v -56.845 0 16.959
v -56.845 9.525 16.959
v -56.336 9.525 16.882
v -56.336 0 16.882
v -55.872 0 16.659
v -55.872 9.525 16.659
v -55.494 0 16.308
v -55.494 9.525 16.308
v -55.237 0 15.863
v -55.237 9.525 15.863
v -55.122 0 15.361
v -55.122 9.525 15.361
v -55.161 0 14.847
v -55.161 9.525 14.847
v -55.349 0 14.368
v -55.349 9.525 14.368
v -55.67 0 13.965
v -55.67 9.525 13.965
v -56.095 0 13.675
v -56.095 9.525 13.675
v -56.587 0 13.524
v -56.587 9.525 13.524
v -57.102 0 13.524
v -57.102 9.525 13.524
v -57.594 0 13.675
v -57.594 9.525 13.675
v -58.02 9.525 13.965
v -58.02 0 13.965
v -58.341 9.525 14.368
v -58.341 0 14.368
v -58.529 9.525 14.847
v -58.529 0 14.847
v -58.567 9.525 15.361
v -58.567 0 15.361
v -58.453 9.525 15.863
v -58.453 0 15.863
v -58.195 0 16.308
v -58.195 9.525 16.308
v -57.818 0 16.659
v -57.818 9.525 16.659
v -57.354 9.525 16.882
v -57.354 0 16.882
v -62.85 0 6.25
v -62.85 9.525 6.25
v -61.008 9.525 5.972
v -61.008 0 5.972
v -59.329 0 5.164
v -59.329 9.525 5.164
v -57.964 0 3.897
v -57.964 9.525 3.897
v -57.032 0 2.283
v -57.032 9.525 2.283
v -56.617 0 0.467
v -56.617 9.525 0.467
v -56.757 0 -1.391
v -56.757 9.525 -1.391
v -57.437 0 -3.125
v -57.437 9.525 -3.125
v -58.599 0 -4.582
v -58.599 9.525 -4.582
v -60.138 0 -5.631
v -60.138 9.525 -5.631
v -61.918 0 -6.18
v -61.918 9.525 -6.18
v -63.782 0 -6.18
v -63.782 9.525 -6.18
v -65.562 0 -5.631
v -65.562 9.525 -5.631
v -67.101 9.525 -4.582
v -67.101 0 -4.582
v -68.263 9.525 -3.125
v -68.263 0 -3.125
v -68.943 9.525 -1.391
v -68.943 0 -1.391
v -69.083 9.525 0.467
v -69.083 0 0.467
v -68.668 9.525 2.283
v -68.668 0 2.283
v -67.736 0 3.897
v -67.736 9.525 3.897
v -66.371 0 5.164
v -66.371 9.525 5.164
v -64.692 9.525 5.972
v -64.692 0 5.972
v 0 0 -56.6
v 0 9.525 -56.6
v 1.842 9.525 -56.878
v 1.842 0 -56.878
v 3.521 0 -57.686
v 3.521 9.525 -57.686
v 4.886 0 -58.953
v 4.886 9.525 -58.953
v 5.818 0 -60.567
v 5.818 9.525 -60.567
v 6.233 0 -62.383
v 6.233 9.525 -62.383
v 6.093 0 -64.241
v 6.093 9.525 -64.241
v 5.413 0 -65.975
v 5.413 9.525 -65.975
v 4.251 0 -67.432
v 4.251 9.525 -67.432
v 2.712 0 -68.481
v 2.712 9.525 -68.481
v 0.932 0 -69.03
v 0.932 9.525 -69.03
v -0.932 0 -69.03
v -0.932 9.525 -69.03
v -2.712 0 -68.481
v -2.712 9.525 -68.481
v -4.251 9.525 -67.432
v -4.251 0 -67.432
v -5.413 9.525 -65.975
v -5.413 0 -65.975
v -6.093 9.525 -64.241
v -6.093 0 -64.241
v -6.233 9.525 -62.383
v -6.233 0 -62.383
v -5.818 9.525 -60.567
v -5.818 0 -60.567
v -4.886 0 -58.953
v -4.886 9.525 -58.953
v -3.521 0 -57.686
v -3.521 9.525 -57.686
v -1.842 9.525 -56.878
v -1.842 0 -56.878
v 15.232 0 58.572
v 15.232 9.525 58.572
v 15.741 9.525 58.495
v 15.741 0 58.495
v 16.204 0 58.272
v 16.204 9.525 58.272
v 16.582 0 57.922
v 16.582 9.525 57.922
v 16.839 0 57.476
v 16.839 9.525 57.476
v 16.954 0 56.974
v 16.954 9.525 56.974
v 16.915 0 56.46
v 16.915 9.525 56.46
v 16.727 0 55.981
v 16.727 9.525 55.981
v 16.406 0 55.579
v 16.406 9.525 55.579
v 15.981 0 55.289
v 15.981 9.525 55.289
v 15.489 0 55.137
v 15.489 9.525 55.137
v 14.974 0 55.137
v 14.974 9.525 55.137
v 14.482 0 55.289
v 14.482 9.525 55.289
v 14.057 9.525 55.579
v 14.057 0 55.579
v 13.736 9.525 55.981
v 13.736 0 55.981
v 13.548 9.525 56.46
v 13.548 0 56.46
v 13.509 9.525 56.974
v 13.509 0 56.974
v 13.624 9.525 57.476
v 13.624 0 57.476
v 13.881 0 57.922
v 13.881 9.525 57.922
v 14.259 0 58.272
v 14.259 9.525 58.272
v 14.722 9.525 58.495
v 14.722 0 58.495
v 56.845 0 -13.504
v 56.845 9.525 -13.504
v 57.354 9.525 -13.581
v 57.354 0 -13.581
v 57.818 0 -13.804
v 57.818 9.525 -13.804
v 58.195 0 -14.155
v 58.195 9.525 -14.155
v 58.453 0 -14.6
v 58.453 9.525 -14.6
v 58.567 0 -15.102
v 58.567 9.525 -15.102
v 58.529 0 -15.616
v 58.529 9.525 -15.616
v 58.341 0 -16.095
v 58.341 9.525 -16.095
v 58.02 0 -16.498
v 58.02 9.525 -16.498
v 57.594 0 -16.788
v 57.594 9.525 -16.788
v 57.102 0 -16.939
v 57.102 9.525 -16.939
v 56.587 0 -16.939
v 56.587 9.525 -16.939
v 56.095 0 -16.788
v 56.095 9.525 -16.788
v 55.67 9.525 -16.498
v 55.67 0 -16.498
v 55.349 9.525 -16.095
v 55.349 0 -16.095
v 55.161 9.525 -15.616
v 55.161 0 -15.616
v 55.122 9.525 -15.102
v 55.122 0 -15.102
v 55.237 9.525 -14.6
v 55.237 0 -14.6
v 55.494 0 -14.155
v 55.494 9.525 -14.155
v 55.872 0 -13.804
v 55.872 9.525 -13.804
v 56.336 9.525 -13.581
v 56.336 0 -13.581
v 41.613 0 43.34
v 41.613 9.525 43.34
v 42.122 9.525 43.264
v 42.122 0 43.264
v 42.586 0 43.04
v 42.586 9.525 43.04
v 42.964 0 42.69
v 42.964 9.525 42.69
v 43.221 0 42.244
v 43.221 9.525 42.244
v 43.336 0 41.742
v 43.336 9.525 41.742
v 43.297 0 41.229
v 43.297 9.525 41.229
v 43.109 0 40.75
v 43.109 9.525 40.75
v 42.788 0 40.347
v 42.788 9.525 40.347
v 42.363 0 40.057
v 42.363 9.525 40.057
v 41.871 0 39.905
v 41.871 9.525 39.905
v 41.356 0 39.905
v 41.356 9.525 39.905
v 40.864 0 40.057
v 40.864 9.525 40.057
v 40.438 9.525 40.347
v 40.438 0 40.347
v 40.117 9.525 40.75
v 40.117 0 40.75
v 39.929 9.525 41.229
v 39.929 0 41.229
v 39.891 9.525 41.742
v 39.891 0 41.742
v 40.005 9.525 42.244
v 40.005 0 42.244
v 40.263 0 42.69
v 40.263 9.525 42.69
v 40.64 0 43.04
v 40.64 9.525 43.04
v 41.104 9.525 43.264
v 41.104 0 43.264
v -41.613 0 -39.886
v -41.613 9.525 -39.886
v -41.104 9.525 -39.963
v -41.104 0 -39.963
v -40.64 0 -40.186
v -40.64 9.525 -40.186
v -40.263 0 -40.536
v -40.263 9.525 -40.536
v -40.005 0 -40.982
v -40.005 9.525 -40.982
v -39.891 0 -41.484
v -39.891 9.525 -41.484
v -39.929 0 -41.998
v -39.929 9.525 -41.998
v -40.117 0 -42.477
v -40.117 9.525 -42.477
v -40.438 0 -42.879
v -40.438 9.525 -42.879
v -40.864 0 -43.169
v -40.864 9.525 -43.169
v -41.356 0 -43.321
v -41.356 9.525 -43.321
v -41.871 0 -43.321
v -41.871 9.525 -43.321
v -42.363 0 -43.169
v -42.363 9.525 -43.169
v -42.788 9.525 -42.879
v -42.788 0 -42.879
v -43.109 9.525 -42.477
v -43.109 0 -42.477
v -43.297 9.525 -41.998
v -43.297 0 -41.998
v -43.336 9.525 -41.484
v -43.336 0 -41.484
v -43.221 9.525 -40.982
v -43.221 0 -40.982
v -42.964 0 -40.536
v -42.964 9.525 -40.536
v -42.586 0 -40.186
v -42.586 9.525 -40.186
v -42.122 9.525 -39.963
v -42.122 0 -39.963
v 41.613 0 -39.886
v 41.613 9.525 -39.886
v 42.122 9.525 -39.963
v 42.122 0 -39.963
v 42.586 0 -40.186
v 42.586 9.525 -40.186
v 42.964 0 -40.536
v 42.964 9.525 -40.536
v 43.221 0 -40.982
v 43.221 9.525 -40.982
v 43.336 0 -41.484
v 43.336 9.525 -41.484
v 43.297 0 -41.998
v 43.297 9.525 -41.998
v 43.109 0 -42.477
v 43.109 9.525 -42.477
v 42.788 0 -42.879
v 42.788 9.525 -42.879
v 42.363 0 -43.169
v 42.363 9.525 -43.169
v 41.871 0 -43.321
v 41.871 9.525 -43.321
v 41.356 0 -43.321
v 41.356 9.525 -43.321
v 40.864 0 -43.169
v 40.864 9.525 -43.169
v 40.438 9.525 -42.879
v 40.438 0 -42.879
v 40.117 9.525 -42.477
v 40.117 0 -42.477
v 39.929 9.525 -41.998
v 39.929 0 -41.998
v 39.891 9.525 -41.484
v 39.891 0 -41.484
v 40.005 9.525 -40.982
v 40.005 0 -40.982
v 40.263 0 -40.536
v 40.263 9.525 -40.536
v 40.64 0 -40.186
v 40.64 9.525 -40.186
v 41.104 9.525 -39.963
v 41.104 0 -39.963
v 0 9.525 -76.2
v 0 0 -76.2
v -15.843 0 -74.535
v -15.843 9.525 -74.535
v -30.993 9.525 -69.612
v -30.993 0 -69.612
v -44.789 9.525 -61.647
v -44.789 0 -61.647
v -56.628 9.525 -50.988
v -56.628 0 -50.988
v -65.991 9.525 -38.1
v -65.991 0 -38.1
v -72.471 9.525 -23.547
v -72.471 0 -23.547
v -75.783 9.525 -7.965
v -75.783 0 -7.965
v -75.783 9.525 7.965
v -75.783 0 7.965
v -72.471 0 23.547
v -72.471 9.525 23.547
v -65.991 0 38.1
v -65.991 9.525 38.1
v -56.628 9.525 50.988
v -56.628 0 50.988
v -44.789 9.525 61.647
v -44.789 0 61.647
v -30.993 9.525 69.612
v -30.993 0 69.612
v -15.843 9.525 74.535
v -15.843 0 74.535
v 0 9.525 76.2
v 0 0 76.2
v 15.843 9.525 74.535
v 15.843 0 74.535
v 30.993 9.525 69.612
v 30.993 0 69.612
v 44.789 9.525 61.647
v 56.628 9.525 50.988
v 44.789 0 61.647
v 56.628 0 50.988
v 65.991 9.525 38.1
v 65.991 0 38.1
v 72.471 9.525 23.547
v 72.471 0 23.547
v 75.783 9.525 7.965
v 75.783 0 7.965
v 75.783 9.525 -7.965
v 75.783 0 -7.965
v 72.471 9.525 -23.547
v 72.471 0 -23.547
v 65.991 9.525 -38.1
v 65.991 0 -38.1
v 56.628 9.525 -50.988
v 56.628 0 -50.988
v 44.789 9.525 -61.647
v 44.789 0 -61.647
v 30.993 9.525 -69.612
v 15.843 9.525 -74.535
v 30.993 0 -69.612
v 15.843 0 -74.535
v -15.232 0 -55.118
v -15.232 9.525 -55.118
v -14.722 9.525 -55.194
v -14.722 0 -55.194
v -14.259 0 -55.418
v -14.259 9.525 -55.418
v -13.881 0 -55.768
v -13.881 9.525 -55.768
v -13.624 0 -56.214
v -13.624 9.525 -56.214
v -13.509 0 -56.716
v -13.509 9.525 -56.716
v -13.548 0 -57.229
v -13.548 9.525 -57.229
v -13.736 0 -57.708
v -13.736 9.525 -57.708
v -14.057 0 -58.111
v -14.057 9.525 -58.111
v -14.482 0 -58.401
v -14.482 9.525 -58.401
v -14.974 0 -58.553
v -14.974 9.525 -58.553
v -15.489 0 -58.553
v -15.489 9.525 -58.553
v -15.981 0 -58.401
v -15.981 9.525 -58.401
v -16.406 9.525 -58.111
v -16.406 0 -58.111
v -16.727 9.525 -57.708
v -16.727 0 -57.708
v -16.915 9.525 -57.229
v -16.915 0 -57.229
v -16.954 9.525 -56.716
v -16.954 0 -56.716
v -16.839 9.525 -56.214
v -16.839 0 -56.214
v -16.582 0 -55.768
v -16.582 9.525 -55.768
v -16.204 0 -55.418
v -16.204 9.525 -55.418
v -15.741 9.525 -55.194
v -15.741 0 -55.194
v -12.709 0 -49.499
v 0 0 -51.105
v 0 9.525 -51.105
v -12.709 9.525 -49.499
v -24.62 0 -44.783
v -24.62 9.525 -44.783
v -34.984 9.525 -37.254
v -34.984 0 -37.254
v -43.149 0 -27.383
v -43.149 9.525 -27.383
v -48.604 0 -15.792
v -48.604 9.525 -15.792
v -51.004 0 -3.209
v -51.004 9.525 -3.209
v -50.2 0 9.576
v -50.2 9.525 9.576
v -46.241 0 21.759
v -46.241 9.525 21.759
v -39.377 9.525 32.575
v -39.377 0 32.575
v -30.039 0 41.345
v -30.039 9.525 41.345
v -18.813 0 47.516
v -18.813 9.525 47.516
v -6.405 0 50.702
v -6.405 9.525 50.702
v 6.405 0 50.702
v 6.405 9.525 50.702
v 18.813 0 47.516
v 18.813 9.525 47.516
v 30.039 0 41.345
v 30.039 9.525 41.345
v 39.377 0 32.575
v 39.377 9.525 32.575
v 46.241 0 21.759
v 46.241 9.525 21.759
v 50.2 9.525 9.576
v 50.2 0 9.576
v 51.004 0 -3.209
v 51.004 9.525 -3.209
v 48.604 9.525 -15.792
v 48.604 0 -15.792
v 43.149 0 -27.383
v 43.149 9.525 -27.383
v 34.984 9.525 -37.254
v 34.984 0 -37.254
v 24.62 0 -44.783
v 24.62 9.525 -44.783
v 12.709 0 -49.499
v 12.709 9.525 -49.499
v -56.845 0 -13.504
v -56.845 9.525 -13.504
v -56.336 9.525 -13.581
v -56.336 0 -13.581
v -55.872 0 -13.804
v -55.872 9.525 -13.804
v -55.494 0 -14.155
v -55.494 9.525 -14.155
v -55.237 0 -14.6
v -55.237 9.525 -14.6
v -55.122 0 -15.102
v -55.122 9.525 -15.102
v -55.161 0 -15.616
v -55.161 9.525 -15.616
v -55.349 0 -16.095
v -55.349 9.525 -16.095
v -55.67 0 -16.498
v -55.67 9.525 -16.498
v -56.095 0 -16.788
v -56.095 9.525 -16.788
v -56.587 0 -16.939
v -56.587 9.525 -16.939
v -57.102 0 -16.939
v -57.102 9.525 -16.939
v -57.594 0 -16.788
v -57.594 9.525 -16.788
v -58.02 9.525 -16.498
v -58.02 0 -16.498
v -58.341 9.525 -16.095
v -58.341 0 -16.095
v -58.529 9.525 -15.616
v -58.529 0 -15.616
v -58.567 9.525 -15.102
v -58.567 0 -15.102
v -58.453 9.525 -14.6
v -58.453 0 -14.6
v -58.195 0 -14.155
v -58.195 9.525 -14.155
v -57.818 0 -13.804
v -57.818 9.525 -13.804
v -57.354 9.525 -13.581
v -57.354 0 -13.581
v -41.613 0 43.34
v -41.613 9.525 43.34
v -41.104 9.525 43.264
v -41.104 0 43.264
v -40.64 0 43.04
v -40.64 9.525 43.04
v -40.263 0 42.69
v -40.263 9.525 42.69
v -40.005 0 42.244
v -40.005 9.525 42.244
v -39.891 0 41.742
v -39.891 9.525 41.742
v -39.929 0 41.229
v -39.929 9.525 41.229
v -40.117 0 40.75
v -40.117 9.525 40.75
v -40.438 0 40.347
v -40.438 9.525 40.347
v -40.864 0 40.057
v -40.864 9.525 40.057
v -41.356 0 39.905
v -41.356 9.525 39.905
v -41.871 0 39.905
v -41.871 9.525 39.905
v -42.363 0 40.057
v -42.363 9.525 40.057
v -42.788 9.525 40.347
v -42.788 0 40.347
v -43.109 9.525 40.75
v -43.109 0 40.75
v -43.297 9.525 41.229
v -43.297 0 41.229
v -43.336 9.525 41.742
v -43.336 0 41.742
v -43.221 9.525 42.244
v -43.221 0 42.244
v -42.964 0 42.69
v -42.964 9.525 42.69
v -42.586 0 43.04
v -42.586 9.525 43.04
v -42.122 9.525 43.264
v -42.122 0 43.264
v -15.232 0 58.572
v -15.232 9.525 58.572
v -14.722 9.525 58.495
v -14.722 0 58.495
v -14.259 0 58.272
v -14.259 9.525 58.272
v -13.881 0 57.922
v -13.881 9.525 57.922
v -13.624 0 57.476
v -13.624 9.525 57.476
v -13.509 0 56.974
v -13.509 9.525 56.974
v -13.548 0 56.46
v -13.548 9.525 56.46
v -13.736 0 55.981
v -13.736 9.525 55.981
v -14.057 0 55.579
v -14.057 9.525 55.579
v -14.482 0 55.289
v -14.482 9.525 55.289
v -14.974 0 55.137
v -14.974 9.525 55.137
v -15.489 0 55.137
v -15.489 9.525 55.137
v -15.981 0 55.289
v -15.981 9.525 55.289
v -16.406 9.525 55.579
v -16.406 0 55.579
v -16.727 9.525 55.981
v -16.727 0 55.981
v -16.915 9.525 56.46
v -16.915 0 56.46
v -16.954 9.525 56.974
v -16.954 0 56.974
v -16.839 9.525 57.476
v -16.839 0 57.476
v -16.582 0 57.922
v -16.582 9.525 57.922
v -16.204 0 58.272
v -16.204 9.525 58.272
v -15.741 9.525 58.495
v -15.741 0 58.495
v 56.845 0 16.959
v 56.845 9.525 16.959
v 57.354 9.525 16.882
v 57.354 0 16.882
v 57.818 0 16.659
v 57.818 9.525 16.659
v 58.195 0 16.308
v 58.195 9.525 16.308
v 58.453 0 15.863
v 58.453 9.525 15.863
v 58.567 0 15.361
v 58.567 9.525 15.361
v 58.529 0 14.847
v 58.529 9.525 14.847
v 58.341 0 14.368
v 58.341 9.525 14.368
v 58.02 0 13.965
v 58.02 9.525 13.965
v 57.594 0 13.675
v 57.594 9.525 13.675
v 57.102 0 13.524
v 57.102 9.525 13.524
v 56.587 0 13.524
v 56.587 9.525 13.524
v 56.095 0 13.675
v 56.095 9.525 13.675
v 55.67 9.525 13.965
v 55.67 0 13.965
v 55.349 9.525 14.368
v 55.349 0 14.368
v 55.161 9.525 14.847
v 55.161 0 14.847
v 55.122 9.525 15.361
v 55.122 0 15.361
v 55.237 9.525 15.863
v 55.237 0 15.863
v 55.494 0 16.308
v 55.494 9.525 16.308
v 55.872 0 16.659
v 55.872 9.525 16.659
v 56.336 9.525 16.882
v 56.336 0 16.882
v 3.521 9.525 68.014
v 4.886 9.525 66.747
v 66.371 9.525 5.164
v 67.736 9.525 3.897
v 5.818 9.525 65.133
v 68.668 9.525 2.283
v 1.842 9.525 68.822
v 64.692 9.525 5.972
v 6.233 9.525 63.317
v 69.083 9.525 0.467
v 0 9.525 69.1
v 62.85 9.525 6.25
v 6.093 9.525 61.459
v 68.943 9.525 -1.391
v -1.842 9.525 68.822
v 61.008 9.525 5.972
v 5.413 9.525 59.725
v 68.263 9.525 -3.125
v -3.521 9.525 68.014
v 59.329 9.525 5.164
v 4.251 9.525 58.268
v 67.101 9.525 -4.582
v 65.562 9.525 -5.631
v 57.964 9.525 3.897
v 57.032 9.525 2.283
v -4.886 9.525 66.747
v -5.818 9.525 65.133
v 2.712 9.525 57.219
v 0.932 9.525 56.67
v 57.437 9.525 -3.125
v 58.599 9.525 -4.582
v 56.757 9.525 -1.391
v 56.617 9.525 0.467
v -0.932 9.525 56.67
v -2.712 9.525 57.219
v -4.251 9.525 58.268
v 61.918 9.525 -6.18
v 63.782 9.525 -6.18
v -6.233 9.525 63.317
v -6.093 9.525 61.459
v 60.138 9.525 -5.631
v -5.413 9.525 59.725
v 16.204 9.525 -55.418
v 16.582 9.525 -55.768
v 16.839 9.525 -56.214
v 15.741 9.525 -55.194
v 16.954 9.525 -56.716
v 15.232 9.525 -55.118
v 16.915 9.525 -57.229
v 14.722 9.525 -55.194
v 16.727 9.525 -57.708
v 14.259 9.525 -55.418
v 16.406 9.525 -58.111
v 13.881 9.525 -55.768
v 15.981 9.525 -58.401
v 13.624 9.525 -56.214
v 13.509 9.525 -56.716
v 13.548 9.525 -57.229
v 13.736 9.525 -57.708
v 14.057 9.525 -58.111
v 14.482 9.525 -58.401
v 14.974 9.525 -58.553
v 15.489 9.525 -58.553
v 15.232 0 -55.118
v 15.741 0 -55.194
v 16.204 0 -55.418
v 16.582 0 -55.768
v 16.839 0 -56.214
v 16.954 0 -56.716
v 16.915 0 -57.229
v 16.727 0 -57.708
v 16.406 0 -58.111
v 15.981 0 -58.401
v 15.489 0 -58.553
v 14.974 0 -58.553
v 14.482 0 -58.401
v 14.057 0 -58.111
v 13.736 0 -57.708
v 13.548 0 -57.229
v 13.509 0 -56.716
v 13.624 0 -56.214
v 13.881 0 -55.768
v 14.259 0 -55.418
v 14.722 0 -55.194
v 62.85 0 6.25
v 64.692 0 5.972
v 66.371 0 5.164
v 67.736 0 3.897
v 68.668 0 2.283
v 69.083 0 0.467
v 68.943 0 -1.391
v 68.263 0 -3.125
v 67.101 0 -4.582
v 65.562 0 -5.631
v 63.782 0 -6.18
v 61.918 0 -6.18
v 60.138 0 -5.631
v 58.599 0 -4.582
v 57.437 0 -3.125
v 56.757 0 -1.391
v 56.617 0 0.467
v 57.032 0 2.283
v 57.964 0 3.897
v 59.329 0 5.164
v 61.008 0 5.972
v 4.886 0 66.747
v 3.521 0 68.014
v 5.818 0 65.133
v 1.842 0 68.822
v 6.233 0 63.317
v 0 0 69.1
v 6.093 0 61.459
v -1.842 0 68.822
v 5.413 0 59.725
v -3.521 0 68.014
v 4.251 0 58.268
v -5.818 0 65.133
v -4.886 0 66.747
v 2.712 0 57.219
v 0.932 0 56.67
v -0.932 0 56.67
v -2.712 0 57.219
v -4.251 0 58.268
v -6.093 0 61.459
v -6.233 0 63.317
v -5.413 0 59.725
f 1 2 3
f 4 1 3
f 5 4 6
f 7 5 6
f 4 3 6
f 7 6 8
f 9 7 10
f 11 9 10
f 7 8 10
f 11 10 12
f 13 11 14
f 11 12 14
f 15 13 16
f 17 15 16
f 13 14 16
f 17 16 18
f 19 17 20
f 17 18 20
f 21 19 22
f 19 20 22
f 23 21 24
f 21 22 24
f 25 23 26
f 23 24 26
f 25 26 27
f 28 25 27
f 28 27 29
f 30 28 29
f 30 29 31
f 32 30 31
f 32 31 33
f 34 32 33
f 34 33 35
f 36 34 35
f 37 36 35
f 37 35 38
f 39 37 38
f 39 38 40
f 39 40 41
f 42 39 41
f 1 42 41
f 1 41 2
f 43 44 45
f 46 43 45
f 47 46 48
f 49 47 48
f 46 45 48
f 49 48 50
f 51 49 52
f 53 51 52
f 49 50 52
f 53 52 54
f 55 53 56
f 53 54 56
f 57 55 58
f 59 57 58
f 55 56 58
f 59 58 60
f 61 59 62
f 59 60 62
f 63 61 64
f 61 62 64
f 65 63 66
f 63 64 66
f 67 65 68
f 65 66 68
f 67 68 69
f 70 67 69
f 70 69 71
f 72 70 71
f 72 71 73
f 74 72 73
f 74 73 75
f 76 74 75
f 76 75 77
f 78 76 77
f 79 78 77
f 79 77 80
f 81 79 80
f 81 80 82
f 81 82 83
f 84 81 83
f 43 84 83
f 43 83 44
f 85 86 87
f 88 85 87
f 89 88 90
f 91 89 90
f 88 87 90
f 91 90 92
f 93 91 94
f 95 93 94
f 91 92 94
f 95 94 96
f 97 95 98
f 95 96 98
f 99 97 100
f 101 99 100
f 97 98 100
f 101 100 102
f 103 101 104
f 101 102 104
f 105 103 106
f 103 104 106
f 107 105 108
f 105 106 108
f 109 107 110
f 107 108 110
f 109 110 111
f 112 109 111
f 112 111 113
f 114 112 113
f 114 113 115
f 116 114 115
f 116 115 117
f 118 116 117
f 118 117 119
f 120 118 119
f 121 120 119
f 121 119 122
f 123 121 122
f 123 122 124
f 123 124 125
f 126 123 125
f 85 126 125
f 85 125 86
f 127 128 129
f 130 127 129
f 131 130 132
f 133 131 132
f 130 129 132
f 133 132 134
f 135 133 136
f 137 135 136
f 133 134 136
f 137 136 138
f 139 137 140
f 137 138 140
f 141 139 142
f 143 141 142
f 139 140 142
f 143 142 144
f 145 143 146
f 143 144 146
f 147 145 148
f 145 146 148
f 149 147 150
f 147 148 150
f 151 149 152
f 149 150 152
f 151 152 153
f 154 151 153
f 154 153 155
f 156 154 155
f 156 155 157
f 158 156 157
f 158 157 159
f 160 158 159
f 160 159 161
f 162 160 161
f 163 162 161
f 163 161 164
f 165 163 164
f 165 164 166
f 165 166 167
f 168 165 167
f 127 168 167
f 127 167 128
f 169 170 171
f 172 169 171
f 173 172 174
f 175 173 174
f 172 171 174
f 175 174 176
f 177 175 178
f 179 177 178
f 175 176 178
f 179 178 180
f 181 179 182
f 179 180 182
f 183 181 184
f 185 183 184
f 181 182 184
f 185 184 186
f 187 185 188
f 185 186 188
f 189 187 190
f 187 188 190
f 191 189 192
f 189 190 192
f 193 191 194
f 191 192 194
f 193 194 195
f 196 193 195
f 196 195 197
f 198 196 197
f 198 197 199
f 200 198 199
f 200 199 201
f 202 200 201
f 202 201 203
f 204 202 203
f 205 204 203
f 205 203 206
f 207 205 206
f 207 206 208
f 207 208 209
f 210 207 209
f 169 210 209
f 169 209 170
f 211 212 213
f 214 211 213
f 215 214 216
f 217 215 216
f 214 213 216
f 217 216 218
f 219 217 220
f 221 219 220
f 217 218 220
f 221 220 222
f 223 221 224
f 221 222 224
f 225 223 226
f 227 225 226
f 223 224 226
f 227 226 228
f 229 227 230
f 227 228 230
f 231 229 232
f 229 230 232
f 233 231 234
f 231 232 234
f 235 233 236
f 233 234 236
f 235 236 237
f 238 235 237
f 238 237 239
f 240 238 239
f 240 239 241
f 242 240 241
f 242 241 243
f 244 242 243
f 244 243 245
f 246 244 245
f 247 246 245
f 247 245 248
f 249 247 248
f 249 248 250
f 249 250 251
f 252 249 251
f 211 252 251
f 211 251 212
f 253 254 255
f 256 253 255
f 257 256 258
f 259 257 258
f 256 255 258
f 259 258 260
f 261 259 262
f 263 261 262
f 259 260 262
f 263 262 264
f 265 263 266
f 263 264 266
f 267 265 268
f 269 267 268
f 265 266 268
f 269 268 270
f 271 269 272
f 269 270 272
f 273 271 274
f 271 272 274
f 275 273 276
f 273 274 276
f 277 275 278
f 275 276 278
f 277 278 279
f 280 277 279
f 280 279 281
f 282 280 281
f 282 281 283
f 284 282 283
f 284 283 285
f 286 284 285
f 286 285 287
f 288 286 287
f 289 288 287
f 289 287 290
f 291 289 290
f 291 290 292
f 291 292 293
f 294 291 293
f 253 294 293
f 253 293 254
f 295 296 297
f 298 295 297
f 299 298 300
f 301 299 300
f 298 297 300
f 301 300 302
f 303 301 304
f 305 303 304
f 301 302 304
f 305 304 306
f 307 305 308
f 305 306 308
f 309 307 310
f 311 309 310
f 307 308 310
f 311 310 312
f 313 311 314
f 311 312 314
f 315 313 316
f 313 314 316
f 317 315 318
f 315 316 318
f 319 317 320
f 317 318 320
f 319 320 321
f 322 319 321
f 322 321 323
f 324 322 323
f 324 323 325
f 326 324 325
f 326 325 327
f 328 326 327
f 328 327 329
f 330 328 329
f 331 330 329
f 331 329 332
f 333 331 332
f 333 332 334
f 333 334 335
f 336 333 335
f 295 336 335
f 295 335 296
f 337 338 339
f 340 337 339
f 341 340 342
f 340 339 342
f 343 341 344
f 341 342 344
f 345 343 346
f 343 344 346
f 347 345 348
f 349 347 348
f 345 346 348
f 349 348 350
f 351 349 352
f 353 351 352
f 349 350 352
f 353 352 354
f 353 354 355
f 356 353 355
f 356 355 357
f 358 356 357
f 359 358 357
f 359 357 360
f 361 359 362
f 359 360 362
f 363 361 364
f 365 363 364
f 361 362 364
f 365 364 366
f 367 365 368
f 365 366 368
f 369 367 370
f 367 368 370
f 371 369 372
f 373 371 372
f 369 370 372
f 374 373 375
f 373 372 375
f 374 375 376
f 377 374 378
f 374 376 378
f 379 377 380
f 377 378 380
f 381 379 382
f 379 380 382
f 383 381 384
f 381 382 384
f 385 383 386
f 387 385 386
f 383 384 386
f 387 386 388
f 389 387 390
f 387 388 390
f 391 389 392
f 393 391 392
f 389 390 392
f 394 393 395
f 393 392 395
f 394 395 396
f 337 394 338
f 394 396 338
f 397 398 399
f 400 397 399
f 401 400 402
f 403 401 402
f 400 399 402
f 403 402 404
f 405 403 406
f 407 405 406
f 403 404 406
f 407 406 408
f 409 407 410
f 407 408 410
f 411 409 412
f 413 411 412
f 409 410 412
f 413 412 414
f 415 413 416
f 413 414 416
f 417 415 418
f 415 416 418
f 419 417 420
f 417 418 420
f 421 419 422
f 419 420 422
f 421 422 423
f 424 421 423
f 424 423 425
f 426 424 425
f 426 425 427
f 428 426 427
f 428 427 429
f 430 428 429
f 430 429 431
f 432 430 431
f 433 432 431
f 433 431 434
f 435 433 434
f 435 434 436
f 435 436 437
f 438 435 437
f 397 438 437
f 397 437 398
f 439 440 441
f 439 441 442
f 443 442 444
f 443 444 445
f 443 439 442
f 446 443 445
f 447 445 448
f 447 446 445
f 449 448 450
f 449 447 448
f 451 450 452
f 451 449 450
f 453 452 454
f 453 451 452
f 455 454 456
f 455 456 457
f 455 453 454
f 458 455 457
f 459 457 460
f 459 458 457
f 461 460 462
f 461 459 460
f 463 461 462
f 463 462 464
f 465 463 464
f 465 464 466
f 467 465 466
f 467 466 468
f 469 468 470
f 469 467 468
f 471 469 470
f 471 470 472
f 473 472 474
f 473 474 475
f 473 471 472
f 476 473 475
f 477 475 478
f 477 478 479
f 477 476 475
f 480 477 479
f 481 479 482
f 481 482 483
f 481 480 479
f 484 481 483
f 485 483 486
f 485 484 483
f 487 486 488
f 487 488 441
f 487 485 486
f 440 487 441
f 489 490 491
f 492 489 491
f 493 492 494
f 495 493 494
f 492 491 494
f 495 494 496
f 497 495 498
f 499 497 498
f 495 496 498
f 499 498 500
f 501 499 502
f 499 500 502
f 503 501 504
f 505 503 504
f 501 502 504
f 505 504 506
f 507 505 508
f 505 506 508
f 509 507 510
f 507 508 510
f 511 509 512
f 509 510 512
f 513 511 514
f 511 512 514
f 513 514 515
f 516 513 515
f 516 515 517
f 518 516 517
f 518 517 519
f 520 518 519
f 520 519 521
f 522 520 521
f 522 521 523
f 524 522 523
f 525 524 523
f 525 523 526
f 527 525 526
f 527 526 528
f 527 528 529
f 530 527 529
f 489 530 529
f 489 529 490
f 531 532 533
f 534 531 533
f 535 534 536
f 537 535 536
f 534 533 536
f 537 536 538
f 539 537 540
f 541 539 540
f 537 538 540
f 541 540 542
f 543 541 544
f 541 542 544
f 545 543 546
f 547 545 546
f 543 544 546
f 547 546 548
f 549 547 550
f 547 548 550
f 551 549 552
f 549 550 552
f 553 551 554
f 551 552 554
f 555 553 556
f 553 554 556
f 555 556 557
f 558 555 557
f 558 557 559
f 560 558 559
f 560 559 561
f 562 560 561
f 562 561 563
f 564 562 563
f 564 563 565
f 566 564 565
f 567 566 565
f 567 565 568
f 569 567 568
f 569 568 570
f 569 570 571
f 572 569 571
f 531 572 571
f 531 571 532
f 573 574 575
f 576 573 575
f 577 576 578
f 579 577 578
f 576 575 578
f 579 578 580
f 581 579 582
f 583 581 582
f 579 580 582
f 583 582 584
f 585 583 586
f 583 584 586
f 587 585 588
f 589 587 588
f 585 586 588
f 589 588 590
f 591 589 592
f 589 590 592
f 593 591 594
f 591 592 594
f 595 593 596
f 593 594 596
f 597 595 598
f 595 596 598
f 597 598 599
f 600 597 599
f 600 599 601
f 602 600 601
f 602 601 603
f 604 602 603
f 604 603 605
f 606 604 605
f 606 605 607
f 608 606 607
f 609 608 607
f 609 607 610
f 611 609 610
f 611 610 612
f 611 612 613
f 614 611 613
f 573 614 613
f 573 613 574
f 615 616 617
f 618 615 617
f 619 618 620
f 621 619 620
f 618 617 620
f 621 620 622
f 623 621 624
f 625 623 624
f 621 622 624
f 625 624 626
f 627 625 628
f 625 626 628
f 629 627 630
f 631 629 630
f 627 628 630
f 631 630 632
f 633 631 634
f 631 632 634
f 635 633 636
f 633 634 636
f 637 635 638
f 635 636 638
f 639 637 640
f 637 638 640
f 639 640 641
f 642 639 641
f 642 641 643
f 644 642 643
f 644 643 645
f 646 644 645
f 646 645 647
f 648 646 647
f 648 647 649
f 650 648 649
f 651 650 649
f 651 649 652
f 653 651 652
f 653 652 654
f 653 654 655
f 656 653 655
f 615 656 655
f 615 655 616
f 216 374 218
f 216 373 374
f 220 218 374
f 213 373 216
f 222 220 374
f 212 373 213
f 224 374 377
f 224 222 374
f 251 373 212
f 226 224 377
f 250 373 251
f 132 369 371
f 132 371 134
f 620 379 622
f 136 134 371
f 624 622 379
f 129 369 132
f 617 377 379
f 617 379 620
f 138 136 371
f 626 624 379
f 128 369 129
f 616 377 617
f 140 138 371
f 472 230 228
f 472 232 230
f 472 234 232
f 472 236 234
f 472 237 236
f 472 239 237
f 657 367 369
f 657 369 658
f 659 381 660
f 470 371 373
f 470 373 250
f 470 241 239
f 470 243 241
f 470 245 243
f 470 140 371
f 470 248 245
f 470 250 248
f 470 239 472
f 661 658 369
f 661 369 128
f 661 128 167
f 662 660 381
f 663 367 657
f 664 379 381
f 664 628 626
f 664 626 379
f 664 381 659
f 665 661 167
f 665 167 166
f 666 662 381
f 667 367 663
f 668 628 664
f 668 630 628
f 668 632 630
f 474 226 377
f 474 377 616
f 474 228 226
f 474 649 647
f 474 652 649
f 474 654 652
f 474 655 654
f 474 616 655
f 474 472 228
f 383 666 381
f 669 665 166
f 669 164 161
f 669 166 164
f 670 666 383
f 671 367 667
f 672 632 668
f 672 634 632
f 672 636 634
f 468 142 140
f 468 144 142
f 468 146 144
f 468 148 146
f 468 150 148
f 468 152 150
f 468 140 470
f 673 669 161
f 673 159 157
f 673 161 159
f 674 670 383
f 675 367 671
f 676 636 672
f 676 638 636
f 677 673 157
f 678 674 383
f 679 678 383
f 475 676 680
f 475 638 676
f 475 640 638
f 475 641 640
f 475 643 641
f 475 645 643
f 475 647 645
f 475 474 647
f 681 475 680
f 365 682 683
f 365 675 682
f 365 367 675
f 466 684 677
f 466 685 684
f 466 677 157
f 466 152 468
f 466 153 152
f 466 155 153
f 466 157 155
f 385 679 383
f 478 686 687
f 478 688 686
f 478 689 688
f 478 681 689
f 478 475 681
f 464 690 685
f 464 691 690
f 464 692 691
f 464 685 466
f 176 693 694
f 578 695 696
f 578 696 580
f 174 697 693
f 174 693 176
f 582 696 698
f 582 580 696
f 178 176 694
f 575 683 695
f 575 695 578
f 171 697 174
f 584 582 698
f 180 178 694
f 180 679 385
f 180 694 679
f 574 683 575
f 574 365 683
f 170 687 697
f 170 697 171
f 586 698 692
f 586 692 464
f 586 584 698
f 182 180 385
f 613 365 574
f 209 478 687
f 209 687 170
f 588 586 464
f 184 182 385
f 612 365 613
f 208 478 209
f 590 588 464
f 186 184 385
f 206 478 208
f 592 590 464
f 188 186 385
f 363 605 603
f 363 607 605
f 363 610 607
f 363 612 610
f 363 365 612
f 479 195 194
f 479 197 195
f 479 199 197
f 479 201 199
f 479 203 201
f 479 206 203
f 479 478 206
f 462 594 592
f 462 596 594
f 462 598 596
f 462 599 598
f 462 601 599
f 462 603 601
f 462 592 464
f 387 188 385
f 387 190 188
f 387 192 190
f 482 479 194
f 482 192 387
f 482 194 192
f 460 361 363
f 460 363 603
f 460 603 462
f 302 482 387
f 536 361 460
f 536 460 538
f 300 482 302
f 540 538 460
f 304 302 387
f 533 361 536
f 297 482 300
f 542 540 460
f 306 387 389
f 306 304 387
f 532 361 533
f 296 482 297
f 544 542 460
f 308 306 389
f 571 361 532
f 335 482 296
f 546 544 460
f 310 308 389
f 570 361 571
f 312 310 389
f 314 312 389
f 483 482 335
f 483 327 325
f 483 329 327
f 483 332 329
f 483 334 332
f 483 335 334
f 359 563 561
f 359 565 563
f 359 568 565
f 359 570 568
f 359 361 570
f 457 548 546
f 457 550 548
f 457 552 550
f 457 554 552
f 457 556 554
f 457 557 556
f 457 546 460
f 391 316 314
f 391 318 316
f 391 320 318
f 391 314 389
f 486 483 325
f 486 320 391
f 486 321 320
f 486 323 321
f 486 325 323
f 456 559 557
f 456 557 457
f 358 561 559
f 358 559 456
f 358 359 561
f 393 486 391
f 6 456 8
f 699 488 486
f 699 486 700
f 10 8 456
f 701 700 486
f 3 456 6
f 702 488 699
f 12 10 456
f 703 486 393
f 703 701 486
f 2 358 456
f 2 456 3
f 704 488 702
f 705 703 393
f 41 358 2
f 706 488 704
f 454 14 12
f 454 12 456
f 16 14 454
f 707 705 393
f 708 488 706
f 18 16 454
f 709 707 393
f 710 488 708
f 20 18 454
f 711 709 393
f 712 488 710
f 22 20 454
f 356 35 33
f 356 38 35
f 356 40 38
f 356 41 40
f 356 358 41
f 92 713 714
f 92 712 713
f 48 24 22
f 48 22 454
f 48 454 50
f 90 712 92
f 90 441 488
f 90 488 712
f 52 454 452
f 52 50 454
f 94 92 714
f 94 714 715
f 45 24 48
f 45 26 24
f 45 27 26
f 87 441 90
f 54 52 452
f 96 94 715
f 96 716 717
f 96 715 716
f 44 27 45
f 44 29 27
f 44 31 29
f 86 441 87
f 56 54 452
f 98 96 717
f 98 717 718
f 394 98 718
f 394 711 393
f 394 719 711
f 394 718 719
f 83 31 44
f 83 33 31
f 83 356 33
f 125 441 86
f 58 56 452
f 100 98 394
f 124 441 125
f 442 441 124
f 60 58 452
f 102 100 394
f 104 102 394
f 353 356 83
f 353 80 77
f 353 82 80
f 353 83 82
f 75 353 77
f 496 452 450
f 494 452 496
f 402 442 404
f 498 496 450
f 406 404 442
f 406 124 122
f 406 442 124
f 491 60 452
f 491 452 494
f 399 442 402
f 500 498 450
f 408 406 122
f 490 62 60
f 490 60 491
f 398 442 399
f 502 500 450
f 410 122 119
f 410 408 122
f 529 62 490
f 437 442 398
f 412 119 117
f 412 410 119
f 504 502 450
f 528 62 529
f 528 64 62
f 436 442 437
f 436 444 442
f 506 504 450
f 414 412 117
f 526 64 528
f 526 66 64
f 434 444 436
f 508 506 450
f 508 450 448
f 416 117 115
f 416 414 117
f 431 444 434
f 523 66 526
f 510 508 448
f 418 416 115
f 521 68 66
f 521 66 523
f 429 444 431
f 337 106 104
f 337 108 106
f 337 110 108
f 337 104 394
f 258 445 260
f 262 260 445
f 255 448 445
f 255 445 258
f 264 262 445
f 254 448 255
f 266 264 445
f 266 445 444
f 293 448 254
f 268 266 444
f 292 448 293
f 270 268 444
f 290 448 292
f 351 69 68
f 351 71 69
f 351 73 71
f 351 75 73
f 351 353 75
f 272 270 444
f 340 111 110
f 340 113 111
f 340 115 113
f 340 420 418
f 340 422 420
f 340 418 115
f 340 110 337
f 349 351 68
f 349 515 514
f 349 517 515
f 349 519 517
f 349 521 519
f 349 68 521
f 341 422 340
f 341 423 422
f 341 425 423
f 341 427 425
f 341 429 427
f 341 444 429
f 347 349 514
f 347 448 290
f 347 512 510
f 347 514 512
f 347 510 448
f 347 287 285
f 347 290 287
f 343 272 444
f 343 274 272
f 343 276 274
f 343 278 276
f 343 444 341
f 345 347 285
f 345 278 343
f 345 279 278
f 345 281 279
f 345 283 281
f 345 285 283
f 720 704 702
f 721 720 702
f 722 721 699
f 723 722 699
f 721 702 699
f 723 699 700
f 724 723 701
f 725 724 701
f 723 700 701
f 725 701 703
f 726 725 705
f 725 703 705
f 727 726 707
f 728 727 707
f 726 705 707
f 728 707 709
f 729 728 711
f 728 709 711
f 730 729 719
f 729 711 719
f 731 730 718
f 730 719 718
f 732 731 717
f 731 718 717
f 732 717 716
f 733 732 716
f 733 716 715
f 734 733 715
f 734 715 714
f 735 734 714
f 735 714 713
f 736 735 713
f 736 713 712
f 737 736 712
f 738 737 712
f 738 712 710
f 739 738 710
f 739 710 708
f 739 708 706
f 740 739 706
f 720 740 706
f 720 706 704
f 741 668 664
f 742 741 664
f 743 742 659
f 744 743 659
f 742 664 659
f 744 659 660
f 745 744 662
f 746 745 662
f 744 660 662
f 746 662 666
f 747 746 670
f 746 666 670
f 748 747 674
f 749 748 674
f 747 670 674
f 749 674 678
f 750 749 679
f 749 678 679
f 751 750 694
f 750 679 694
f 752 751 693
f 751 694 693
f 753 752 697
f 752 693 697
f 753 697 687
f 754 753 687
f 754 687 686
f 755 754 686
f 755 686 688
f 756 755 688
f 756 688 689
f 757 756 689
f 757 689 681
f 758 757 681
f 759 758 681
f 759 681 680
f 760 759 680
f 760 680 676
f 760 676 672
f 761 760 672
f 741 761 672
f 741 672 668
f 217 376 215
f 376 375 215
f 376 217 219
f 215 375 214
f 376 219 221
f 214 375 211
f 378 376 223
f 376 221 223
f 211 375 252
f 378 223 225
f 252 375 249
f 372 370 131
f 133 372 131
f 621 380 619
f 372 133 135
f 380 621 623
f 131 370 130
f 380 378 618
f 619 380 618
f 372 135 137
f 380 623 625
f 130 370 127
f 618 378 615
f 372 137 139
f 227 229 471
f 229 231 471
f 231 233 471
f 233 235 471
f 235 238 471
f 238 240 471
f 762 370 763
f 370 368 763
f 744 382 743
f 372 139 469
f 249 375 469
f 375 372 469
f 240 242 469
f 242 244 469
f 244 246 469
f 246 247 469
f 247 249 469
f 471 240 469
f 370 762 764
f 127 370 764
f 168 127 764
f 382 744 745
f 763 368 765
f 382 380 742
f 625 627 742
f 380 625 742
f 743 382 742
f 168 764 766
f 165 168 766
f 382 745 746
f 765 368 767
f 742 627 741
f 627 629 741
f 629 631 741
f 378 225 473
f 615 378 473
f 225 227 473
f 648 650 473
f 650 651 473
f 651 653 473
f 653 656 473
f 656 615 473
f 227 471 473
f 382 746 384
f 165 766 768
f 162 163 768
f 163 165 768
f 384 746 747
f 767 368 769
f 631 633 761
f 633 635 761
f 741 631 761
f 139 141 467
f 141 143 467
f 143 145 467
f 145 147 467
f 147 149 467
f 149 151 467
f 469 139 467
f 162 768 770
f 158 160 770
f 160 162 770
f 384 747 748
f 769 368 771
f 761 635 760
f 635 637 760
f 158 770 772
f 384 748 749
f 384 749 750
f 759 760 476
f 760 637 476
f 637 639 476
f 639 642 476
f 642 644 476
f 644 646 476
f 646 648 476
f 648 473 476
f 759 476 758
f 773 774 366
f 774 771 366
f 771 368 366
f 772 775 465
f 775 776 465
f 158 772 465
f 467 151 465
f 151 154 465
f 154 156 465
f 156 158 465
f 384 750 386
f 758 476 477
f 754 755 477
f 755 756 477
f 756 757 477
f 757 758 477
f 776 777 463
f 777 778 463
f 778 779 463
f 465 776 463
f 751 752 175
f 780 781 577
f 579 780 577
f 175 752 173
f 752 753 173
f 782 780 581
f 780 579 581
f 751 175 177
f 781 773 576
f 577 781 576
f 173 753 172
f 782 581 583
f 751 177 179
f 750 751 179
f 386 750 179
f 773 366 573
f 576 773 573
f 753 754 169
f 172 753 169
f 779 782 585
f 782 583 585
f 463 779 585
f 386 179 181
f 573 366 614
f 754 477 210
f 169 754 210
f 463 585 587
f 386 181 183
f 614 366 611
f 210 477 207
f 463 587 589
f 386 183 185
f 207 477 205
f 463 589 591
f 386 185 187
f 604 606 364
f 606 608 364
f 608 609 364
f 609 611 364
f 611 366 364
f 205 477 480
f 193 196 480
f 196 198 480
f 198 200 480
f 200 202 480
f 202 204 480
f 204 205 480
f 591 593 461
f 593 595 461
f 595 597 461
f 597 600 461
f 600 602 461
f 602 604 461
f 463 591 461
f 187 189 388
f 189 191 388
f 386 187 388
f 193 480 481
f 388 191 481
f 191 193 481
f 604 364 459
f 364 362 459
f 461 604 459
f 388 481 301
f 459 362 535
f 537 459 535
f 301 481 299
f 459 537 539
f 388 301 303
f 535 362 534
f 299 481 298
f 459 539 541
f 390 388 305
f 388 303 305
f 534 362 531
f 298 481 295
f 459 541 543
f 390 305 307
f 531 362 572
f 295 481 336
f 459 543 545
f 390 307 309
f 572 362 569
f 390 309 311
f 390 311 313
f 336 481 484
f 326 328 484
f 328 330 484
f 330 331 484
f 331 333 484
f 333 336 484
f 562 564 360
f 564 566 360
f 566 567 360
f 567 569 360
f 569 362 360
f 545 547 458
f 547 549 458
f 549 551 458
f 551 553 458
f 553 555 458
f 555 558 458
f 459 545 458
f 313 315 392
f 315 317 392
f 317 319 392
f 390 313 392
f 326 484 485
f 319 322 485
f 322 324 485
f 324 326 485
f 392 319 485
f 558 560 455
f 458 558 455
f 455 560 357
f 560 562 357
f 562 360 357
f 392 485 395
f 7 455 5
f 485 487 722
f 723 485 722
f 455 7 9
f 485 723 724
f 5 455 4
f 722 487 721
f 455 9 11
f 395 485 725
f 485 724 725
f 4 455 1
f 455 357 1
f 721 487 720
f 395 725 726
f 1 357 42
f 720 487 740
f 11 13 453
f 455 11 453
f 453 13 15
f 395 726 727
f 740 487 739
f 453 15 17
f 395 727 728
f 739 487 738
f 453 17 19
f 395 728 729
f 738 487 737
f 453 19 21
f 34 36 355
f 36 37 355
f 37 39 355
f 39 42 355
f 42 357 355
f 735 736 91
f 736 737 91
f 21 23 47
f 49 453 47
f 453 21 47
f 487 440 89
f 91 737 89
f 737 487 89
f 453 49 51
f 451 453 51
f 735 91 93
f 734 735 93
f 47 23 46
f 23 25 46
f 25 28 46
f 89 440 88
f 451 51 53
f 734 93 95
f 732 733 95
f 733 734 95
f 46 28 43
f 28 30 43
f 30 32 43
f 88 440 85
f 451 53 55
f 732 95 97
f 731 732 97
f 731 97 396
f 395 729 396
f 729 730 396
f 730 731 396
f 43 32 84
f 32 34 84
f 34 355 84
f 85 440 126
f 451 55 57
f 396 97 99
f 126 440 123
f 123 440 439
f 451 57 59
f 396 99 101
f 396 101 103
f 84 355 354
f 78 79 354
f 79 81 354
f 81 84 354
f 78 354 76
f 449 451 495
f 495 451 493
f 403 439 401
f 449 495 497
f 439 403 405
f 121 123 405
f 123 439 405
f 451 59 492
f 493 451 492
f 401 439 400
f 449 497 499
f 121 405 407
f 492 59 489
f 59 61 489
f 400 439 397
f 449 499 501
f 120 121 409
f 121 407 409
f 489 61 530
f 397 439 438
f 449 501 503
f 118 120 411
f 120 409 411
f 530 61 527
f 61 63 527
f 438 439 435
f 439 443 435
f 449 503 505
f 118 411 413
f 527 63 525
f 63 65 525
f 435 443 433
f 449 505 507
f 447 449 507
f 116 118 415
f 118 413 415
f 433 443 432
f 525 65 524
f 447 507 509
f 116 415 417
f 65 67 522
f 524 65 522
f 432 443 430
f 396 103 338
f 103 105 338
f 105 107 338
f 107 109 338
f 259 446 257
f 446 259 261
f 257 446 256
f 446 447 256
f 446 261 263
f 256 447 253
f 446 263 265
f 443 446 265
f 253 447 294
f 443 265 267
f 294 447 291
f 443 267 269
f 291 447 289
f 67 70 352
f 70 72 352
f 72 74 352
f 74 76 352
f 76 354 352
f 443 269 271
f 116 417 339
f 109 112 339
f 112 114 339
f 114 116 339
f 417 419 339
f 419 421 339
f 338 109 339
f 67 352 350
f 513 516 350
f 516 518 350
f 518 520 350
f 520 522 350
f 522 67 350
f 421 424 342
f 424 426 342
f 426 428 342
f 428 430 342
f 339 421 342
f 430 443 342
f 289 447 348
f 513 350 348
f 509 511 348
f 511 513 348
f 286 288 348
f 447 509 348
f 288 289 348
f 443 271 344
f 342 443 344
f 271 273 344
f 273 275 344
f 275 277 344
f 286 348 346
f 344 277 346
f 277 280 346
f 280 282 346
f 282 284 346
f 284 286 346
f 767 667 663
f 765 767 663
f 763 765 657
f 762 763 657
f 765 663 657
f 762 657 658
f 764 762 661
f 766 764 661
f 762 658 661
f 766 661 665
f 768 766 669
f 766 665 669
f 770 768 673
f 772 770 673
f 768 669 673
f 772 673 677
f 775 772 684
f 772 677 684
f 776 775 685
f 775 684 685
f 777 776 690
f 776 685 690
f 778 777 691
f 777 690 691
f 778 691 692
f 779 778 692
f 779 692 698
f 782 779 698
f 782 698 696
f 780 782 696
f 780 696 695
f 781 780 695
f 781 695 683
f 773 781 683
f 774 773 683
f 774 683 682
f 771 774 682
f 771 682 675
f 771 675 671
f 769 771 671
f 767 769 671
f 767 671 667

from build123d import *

# Parameters (mm, degrees)
SKETCH1_R           = 76.2
SKETCH1_R_2         = 51.1048
BOSS_EXTRUDE1_DEPTH = 9.525
SKETCH2_R           = 1.7272
CUT_EXTRUDE1_DEPTH  = 109.183203987
SKETCH3_R           = 6.249999946
CUT_EXTRUDE2_DEPTH  = 109.183203987


with BuildPart() as part:
    # Sketch1 → Boss-Extrude1 (new body)
    with BuildSketch(Plane(origin=(0, 0, 0), x_dir=(1, 0, 0), z_dir=(0, 1, 0))):
        with Locations(Location((0, 0, 0), (0, 0, 90))):
            Circle(SKETCH1_R)
        with Locations(Location((0, 0, 0), (0, 0, 90))):
            Circle(SKETCH1_R_2, mode=Mode.SUBTRACT)
    extrude(amount=BOSS_EXTRUDE1_DEPTH)

    # Sketch2 → Cut-Extrude1 (cut, through all)
    with BuildSketch(Plane(origin=(0, 9.525, 0), x_dir=(1, 0, 0), z_dir=(0, 1, 0))):
        with Locations(Location((-15.231500779, 56.844734782, 0), (0, 0, 270))):
            Circle(SKETCH2_R)
        with Locations(Location((15.231500779, 56.844734782, 0), (0, 0, 270))):
            Circle(SKETCH2_R)
        with Locations(Location((41.613234004, 41.613234004, 0), (0, 0, 270))):
            Circle(SKETCH2_R)
        with Locations(Location((56.844734782, 15.231500779, 0), (0, 0, 270))):
            Circle(SKETCH2_R)
        with Locations(Location((56.844734782, -15.231500779, 0), (0, 0, 270))):
            Circle(SKETCH2_R)
        with Locations(Location((41.613234004, -41.613234004, 0), (0, 0, 270))):
            Circle(SKETCH2_R)
        with Locations(Location((15.231500779, -56.844734782, 0), (0, 0, 270))):
            Circle(SKETCH2_R)
        with Locations(Location((-15.231500779, -56.844734782, 0), (0, 0, 270))):
            Circle(SKETCH2_R)
        with Locations(Location((-41.613234004, -41.613234004, 0), (0, 0, 270))):
            Circle(SKETCH2_R)
        with Locations(Location((-56.844734782, -15.231500779, 0), (0, 0, 270))):
            Circle(SKETCH2_R)
        with Locations(Location((-56.844734782, 15.231500779, 0), (0, 0, 270))):
            Circle(SKETCH2_R)
        with Locations(Location((-41.613234004, 41.613234004, 0), (0, 0, 270))):
            Circle(SKETCH2_R)
    extrude(amount=-CUT_EXTRUDE1_DEPTH, mode=Mode.SUBTRACT)

    # Sketch3 → Cut-Extrude2 (cut, through all)
    with BuildSketch(Plane(origin=(0, 9.525, 0), x_dir=(1, 0, 0), z_dir=(0, 1, 0))):
        with Locations(Location((-62.85000003, 0, 0), (0, 0, 270))):
            Circle(SKETCH3_R)
        with Locations(Location((0, 62.85000003, 0), (0, 0, 270))):
            Circle(SKETCH3_R)
        with Locations(Location((62.85000003, 0, 0), (0, 0, 270))):
            Circle(SKETCH3_R)
        with Locations(Location((0, -62.85000003, 0), (0, 0, 270))):
            Circle(SKETCH3_R)
    extrude(amount=-CUT_EXTRUDE2_DEPTH, mode=Mode.SUBTRACT)


solid = part.part
